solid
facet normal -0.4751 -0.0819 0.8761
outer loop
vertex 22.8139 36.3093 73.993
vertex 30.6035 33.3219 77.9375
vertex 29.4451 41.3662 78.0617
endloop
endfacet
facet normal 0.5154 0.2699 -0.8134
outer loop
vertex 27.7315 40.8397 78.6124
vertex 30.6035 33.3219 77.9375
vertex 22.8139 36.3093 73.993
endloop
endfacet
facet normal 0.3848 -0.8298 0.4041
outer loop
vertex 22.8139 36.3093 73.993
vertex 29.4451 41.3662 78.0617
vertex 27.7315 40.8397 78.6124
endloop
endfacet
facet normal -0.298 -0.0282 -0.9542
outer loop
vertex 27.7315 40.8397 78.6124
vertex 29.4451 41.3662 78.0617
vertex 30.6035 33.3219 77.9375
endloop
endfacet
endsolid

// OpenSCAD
// Auto-generated auxetic polyhedron
points = [
    [29.445114, 41.366173, 78.061712],
    [30.603458, 33.321950, 77.937477],
    [22.813904, 36.309331, 73.992990],
    [27.731457, 40.839674, 78.612439],
];

faces = [
    [0, 1, 2],
    [2, 1, 3],
    [3, 0, 2],
    [1, 0, 3],
];

polyhedron(points = points, faces = faces);
